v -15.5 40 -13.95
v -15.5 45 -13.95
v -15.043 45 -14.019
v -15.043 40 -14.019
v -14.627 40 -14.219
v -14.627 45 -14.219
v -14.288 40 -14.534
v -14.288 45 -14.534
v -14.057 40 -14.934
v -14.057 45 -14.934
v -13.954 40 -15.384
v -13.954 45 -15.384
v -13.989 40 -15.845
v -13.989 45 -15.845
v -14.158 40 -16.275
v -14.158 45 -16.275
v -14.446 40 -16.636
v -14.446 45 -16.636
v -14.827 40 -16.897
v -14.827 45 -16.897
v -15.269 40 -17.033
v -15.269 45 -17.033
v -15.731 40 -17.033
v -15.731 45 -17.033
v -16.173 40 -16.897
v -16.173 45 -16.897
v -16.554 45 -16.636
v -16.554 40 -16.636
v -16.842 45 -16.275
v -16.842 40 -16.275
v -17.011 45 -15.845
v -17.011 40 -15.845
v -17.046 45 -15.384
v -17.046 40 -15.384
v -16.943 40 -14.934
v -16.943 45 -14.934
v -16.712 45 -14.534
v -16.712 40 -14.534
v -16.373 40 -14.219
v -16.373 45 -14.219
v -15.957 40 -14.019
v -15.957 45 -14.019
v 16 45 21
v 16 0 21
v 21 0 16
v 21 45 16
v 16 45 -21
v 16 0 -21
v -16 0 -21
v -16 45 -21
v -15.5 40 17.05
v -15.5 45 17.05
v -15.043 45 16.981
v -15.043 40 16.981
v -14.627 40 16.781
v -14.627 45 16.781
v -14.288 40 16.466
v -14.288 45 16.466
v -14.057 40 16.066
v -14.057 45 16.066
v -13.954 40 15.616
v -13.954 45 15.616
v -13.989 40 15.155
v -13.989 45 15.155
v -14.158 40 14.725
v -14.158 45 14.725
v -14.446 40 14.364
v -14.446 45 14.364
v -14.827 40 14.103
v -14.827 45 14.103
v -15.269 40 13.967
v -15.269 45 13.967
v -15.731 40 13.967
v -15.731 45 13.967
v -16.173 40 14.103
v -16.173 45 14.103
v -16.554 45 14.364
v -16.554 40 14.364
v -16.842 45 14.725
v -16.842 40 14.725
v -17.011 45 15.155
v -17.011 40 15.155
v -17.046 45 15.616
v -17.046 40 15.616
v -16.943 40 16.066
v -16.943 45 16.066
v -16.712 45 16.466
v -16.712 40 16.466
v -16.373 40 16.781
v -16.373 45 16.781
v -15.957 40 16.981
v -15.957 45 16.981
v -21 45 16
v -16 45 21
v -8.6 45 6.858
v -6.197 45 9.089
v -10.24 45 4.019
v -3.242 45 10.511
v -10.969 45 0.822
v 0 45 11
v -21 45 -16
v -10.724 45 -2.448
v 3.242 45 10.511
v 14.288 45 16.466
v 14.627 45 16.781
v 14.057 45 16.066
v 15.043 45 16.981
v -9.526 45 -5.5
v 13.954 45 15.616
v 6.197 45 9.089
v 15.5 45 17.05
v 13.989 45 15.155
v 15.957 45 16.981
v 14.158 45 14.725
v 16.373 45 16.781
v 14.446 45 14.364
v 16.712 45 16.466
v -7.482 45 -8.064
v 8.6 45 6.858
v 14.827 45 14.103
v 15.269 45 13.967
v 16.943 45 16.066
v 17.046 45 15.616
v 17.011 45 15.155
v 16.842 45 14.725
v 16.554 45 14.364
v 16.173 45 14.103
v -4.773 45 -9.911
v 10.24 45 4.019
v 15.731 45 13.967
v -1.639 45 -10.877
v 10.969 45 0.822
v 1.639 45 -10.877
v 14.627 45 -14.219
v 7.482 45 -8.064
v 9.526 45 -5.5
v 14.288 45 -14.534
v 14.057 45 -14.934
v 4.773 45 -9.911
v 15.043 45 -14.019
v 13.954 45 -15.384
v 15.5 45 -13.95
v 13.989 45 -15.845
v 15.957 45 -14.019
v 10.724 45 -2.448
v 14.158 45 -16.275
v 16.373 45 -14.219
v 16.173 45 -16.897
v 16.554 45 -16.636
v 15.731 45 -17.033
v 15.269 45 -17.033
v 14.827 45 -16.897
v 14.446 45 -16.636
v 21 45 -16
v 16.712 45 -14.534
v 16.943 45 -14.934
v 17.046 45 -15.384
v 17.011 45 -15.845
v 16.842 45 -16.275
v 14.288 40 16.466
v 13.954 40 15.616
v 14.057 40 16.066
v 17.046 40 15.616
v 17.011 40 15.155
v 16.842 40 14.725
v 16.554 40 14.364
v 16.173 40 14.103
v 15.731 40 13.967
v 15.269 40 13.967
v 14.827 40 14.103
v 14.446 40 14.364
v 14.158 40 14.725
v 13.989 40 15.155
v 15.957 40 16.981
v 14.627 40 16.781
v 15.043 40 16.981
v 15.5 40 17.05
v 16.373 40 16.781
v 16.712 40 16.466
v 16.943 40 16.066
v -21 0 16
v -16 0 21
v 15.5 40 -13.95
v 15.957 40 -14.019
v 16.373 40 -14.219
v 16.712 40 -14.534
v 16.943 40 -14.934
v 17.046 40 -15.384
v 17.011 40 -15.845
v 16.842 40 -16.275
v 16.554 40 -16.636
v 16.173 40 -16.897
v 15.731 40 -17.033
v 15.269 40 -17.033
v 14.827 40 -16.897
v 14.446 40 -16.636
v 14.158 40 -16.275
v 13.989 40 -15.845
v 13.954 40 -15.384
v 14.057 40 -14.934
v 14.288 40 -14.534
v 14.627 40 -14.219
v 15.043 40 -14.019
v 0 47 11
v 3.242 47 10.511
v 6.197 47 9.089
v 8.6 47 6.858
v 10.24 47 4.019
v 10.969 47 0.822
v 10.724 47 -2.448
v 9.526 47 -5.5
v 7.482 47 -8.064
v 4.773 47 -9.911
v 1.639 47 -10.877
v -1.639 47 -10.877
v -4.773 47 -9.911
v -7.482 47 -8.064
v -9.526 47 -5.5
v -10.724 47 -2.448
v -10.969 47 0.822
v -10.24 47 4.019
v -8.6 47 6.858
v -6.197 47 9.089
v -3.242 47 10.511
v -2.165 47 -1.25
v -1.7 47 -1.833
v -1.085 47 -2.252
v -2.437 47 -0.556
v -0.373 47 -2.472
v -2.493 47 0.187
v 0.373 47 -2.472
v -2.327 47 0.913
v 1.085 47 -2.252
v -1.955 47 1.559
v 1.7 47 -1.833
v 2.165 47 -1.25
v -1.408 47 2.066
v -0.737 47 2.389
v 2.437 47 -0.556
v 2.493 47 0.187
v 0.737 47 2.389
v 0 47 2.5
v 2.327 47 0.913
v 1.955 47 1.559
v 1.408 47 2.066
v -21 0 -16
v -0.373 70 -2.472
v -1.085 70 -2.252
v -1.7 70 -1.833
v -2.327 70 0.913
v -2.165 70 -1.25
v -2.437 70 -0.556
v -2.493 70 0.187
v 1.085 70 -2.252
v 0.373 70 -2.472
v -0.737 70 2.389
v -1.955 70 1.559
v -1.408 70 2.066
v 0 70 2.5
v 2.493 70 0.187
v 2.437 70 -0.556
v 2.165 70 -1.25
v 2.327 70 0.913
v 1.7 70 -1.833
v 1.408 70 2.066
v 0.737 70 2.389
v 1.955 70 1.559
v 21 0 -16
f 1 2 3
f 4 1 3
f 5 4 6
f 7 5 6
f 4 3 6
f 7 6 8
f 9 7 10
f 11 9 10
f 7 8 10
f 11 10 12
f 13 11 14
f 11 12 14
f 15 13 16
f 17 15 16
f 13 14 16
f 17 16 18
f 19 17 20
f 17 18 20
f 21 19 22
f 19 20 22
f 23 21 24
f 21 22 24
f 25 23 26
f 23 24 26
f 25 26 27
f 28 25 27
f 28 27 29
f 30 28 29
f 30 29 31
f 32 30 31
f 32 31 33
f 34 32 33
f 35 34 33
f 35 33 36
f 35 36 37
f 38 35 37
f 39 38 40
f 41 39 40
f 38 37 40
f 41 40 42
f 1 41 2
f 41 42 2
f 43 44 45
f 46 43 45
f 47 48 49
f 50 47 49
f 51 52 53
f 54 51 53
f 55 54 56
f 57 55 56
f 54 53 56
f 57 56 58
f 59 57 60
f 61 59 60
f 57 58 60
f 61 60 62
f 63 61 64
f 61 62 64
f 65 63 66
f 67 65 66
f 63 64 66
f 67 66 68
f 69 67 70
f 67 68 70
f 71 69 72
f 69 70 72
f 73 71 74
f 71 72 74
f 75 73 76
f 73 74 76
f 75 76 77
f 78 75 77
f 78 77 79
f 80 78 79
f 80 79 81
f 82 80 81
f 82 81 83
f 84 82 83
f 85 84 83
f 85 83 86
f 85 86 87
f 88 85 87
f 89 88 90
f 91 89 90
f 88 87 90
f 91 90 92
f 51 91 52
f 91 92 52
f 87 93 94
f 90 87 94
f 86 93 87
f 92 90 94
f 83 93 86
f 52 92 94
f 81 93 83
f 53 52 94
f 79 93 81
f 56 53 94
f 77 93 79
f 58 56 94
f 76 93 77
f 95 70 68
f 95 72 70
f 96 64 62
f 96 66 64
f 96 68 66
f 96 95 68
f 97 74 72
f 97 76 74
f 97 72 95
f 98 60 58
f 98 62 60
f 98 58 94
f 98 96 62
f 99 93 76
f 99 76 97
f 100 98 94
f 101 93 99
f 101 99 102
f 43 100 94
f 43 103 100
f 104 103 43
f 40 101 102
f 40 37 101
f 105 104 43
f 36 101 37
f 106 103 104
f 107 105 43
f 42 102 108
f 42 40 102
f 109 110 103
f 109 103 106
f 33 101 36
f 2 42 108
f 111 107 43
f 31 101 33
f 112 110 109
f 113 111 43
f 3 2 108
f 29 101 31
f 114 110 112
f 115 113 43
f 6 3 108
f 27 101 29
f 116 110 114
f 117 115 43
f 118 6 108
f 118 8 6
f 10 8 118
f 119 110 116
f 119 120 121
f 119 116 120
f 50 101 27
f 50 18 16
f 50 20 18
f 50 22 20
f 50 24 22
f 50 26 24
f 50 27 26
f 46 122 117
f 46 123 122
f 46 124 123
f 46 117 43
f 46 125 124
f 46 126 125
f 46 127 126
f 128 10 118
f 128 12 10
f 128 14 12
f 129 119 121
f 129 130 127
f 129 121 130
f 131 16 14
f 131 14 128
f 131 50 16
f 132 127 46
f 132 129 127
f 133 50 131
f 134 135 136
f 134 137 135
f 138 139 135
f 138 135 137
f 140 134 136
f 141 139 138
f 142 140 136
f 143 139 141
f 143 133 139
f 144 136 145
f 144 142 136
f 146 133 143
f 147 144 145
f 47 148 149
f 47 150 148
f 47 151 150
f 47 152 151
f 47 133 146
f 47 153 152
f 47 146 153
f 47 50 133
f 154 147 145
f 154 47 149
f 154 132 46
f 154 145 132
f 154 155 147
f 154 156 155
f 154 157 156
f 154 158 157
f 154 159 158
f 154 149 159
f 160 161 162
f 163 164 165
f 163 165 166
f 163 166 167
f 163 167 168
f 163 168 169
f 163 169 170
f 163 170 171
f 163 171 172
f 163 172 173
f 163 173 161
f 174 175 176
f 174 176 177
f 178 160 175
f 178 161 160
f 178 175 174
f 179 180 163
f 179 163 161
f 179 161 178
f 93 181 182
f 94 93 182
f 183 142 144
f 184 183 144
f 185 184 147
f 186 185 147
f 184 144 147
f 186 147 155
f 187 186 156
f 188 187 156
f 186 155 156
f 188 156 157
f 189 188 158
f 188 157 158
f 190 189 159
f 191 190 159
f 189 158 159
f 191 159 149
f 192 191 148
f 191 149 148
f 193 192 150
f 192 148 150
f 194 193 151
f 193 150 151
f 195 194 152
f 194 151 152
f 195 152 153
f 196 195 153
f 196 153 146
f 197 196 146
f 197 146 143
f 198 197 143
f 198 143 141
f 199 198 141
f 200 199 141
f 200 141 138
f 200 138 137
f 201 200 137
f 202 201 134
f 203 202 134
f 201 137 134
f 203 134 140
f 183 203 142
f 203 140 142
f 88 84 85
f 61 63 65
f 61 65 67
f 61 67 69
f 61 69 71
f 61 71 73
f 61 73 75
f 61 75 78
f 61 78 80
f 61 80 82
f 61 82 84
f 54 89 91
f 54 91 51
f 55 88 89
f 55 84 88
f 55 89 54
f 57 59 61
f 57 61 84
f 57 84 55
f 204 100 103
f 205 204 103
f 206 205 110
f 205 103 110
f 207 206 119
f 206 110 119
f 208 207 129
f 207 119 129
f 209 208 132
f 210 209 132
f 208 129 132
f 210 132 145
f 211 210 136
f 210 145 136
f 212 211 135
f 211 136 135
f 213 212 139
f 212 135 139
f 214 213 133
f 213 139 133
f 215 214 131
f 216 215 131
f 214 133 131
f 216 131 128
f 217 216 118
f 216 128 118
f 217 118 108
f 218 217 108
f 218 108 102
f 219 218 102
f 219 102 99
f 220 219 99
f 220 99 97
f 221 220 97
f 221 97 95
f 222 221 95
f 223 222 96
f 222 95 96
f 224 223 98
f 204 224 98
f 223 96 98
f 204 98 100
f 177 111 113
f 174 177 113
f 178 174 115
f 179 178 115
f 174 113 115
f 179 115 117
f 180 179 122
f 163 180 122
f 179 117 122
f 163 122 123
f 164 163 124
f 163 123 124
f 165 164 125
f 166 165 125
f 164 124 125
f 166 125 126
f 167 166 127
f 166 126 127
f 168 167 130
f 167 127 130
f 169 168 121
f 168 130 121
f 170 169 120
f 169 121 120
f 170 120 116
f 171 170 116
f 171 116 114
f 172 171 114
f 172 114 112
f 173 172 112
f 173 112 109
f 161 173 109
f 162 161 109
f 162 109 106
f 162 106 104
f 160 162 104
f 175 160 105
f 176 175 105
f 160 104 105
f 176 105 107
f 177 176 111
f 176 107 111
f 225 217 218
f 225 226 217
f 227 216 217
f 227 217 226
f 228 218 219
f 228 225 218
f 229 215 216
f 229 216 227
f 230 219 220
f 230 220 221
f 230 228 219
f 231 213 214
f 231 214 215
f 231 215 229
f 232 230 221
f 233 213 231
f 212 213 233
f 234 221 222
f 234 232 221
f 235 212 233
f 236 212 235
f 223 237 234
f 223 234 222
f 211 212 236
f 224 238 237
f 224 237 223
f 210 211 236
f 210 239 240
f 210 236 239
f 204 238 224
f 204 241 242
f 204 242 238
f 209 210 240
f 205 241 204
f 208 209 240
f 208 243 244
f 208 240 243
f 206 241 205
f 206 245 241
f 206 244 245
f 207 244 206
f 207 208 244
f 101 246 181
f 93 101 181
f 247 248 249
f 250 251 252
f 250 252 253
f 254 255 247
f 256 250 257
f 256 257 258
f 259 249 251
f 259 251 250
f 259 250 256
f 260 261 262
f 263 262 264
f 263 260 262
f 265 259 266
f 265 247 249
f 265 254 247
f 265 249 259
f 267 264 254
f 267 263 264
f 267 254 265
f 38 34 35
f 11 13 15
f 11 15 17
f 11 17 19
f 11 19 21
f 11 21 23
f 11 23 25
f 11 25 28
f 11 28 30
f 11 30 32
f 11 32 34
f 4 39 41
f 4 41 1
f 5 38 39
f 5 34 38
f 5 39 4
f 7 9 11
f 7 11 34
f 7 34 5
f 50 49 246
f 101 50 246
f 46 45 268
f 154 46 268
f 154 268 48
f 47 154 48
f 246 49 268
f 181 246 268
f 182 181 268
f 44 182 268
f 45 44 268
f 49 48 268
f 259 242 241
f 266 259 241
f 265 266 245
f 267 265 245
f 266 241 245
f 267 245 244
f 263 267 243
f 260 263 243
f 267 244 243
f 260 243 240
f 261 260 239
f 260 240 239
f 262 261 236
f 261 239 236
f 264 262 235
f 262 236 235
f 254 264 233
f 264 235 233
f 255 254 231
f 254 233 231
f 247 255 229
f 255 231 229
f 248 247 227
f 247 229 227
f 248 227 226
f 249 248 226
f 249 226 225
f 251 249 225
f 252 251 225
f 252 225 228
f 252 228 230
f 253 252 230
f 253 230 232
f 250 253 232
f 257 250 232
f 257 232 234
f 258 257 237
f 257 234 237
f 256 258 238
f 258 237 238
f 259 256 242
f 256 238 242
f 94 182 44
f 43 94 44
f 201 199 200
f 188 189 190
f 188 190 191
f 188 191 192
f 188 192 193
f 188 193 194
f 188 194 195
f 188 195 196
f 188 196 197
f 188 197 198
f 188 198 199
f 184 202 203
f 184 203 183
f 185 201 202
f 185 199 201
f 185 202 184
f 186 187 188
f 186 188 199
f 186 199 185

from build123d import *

# Parameters (mm, degrees)
EXTRUDE_1_DEPTH     = 45
SKETCH_2_R          = 11
EXTRUDE_2_DEPTH     = 2
SKETCH_3_R          = 2.5
EXTRUDE_3_DEPTH     = 23
SKETCH_4_R          = 1.55
CUT_EXTRUDE_1_DEPTH = 5


with BuildPart() as part:
    # 草图1 → 凸台-拉伸1 (new body)
    with BuildSketch(Plane(origin=(0, 0, 0), x_dir=(1, 0, 0), z_dir=(0, 1, 0))):
        Polygon((-16, 21), (-21, 16), (-21, -16), (-16, -21), (16, -21), (21, -16), (21, 16), (16, 21), align=None)
    extrude(amount=EXTRUDE_1_DEPTH)

    # 草图2 → 凸台-拉伸2 (add)
    with BuildSketch(Plane(origin=(0, 45, 0), x_dir=(1, 0, 0), z_dir=(0, 1, 0))):
        with Locations(Location((0, 0, 0), (0, 0, 270))):
            Circle(SKETCH_2_R)
    extrude(amount=EXTRUDE_2_DEPTH)

    # 草图3 → 凸台-拉伸3 (add)
    with BuildSketch(Plane(origin=(0, 47, 0), x_dir=(1, 0, 0), z_dir=(0, 1, 0))):
        with Locations(Location((0, 0, 0), (0, 0, 270))):
            Circle(SKETCH_3_R)
    extrude(amount=EXTRUDE_3_DEPTH)

    # 草图4 → 切除-拉伸1 (cut)
    with BuildSketch(Plane(origin=(0, 45, 0), x_dir=(1, 0, 0), z_dir=(0, 1, 0))):
        with Locations(Location((-15.5, 15.5, 0), (0, 0, 270))):
            Circle(SKETCH_4_R)
        with Locations(Location((15.5, 15.5, 0), (0, 0, 270))):
            Circle(SKETCH_4_R)
        with Locations(Location((-15.5, -15.5, 0), (0, 0, 270))):
            Circle(SKETCH_4_R)
        with Locations(Location((15.5, -15.5, 0), (0, 0, 270))):
            Circle(SKETCH_4_R)
    extrude(amount=-CUT_EXTRUDE_1_DEPTH, mode=Mode.SUBTRACT)


solid = part.part
